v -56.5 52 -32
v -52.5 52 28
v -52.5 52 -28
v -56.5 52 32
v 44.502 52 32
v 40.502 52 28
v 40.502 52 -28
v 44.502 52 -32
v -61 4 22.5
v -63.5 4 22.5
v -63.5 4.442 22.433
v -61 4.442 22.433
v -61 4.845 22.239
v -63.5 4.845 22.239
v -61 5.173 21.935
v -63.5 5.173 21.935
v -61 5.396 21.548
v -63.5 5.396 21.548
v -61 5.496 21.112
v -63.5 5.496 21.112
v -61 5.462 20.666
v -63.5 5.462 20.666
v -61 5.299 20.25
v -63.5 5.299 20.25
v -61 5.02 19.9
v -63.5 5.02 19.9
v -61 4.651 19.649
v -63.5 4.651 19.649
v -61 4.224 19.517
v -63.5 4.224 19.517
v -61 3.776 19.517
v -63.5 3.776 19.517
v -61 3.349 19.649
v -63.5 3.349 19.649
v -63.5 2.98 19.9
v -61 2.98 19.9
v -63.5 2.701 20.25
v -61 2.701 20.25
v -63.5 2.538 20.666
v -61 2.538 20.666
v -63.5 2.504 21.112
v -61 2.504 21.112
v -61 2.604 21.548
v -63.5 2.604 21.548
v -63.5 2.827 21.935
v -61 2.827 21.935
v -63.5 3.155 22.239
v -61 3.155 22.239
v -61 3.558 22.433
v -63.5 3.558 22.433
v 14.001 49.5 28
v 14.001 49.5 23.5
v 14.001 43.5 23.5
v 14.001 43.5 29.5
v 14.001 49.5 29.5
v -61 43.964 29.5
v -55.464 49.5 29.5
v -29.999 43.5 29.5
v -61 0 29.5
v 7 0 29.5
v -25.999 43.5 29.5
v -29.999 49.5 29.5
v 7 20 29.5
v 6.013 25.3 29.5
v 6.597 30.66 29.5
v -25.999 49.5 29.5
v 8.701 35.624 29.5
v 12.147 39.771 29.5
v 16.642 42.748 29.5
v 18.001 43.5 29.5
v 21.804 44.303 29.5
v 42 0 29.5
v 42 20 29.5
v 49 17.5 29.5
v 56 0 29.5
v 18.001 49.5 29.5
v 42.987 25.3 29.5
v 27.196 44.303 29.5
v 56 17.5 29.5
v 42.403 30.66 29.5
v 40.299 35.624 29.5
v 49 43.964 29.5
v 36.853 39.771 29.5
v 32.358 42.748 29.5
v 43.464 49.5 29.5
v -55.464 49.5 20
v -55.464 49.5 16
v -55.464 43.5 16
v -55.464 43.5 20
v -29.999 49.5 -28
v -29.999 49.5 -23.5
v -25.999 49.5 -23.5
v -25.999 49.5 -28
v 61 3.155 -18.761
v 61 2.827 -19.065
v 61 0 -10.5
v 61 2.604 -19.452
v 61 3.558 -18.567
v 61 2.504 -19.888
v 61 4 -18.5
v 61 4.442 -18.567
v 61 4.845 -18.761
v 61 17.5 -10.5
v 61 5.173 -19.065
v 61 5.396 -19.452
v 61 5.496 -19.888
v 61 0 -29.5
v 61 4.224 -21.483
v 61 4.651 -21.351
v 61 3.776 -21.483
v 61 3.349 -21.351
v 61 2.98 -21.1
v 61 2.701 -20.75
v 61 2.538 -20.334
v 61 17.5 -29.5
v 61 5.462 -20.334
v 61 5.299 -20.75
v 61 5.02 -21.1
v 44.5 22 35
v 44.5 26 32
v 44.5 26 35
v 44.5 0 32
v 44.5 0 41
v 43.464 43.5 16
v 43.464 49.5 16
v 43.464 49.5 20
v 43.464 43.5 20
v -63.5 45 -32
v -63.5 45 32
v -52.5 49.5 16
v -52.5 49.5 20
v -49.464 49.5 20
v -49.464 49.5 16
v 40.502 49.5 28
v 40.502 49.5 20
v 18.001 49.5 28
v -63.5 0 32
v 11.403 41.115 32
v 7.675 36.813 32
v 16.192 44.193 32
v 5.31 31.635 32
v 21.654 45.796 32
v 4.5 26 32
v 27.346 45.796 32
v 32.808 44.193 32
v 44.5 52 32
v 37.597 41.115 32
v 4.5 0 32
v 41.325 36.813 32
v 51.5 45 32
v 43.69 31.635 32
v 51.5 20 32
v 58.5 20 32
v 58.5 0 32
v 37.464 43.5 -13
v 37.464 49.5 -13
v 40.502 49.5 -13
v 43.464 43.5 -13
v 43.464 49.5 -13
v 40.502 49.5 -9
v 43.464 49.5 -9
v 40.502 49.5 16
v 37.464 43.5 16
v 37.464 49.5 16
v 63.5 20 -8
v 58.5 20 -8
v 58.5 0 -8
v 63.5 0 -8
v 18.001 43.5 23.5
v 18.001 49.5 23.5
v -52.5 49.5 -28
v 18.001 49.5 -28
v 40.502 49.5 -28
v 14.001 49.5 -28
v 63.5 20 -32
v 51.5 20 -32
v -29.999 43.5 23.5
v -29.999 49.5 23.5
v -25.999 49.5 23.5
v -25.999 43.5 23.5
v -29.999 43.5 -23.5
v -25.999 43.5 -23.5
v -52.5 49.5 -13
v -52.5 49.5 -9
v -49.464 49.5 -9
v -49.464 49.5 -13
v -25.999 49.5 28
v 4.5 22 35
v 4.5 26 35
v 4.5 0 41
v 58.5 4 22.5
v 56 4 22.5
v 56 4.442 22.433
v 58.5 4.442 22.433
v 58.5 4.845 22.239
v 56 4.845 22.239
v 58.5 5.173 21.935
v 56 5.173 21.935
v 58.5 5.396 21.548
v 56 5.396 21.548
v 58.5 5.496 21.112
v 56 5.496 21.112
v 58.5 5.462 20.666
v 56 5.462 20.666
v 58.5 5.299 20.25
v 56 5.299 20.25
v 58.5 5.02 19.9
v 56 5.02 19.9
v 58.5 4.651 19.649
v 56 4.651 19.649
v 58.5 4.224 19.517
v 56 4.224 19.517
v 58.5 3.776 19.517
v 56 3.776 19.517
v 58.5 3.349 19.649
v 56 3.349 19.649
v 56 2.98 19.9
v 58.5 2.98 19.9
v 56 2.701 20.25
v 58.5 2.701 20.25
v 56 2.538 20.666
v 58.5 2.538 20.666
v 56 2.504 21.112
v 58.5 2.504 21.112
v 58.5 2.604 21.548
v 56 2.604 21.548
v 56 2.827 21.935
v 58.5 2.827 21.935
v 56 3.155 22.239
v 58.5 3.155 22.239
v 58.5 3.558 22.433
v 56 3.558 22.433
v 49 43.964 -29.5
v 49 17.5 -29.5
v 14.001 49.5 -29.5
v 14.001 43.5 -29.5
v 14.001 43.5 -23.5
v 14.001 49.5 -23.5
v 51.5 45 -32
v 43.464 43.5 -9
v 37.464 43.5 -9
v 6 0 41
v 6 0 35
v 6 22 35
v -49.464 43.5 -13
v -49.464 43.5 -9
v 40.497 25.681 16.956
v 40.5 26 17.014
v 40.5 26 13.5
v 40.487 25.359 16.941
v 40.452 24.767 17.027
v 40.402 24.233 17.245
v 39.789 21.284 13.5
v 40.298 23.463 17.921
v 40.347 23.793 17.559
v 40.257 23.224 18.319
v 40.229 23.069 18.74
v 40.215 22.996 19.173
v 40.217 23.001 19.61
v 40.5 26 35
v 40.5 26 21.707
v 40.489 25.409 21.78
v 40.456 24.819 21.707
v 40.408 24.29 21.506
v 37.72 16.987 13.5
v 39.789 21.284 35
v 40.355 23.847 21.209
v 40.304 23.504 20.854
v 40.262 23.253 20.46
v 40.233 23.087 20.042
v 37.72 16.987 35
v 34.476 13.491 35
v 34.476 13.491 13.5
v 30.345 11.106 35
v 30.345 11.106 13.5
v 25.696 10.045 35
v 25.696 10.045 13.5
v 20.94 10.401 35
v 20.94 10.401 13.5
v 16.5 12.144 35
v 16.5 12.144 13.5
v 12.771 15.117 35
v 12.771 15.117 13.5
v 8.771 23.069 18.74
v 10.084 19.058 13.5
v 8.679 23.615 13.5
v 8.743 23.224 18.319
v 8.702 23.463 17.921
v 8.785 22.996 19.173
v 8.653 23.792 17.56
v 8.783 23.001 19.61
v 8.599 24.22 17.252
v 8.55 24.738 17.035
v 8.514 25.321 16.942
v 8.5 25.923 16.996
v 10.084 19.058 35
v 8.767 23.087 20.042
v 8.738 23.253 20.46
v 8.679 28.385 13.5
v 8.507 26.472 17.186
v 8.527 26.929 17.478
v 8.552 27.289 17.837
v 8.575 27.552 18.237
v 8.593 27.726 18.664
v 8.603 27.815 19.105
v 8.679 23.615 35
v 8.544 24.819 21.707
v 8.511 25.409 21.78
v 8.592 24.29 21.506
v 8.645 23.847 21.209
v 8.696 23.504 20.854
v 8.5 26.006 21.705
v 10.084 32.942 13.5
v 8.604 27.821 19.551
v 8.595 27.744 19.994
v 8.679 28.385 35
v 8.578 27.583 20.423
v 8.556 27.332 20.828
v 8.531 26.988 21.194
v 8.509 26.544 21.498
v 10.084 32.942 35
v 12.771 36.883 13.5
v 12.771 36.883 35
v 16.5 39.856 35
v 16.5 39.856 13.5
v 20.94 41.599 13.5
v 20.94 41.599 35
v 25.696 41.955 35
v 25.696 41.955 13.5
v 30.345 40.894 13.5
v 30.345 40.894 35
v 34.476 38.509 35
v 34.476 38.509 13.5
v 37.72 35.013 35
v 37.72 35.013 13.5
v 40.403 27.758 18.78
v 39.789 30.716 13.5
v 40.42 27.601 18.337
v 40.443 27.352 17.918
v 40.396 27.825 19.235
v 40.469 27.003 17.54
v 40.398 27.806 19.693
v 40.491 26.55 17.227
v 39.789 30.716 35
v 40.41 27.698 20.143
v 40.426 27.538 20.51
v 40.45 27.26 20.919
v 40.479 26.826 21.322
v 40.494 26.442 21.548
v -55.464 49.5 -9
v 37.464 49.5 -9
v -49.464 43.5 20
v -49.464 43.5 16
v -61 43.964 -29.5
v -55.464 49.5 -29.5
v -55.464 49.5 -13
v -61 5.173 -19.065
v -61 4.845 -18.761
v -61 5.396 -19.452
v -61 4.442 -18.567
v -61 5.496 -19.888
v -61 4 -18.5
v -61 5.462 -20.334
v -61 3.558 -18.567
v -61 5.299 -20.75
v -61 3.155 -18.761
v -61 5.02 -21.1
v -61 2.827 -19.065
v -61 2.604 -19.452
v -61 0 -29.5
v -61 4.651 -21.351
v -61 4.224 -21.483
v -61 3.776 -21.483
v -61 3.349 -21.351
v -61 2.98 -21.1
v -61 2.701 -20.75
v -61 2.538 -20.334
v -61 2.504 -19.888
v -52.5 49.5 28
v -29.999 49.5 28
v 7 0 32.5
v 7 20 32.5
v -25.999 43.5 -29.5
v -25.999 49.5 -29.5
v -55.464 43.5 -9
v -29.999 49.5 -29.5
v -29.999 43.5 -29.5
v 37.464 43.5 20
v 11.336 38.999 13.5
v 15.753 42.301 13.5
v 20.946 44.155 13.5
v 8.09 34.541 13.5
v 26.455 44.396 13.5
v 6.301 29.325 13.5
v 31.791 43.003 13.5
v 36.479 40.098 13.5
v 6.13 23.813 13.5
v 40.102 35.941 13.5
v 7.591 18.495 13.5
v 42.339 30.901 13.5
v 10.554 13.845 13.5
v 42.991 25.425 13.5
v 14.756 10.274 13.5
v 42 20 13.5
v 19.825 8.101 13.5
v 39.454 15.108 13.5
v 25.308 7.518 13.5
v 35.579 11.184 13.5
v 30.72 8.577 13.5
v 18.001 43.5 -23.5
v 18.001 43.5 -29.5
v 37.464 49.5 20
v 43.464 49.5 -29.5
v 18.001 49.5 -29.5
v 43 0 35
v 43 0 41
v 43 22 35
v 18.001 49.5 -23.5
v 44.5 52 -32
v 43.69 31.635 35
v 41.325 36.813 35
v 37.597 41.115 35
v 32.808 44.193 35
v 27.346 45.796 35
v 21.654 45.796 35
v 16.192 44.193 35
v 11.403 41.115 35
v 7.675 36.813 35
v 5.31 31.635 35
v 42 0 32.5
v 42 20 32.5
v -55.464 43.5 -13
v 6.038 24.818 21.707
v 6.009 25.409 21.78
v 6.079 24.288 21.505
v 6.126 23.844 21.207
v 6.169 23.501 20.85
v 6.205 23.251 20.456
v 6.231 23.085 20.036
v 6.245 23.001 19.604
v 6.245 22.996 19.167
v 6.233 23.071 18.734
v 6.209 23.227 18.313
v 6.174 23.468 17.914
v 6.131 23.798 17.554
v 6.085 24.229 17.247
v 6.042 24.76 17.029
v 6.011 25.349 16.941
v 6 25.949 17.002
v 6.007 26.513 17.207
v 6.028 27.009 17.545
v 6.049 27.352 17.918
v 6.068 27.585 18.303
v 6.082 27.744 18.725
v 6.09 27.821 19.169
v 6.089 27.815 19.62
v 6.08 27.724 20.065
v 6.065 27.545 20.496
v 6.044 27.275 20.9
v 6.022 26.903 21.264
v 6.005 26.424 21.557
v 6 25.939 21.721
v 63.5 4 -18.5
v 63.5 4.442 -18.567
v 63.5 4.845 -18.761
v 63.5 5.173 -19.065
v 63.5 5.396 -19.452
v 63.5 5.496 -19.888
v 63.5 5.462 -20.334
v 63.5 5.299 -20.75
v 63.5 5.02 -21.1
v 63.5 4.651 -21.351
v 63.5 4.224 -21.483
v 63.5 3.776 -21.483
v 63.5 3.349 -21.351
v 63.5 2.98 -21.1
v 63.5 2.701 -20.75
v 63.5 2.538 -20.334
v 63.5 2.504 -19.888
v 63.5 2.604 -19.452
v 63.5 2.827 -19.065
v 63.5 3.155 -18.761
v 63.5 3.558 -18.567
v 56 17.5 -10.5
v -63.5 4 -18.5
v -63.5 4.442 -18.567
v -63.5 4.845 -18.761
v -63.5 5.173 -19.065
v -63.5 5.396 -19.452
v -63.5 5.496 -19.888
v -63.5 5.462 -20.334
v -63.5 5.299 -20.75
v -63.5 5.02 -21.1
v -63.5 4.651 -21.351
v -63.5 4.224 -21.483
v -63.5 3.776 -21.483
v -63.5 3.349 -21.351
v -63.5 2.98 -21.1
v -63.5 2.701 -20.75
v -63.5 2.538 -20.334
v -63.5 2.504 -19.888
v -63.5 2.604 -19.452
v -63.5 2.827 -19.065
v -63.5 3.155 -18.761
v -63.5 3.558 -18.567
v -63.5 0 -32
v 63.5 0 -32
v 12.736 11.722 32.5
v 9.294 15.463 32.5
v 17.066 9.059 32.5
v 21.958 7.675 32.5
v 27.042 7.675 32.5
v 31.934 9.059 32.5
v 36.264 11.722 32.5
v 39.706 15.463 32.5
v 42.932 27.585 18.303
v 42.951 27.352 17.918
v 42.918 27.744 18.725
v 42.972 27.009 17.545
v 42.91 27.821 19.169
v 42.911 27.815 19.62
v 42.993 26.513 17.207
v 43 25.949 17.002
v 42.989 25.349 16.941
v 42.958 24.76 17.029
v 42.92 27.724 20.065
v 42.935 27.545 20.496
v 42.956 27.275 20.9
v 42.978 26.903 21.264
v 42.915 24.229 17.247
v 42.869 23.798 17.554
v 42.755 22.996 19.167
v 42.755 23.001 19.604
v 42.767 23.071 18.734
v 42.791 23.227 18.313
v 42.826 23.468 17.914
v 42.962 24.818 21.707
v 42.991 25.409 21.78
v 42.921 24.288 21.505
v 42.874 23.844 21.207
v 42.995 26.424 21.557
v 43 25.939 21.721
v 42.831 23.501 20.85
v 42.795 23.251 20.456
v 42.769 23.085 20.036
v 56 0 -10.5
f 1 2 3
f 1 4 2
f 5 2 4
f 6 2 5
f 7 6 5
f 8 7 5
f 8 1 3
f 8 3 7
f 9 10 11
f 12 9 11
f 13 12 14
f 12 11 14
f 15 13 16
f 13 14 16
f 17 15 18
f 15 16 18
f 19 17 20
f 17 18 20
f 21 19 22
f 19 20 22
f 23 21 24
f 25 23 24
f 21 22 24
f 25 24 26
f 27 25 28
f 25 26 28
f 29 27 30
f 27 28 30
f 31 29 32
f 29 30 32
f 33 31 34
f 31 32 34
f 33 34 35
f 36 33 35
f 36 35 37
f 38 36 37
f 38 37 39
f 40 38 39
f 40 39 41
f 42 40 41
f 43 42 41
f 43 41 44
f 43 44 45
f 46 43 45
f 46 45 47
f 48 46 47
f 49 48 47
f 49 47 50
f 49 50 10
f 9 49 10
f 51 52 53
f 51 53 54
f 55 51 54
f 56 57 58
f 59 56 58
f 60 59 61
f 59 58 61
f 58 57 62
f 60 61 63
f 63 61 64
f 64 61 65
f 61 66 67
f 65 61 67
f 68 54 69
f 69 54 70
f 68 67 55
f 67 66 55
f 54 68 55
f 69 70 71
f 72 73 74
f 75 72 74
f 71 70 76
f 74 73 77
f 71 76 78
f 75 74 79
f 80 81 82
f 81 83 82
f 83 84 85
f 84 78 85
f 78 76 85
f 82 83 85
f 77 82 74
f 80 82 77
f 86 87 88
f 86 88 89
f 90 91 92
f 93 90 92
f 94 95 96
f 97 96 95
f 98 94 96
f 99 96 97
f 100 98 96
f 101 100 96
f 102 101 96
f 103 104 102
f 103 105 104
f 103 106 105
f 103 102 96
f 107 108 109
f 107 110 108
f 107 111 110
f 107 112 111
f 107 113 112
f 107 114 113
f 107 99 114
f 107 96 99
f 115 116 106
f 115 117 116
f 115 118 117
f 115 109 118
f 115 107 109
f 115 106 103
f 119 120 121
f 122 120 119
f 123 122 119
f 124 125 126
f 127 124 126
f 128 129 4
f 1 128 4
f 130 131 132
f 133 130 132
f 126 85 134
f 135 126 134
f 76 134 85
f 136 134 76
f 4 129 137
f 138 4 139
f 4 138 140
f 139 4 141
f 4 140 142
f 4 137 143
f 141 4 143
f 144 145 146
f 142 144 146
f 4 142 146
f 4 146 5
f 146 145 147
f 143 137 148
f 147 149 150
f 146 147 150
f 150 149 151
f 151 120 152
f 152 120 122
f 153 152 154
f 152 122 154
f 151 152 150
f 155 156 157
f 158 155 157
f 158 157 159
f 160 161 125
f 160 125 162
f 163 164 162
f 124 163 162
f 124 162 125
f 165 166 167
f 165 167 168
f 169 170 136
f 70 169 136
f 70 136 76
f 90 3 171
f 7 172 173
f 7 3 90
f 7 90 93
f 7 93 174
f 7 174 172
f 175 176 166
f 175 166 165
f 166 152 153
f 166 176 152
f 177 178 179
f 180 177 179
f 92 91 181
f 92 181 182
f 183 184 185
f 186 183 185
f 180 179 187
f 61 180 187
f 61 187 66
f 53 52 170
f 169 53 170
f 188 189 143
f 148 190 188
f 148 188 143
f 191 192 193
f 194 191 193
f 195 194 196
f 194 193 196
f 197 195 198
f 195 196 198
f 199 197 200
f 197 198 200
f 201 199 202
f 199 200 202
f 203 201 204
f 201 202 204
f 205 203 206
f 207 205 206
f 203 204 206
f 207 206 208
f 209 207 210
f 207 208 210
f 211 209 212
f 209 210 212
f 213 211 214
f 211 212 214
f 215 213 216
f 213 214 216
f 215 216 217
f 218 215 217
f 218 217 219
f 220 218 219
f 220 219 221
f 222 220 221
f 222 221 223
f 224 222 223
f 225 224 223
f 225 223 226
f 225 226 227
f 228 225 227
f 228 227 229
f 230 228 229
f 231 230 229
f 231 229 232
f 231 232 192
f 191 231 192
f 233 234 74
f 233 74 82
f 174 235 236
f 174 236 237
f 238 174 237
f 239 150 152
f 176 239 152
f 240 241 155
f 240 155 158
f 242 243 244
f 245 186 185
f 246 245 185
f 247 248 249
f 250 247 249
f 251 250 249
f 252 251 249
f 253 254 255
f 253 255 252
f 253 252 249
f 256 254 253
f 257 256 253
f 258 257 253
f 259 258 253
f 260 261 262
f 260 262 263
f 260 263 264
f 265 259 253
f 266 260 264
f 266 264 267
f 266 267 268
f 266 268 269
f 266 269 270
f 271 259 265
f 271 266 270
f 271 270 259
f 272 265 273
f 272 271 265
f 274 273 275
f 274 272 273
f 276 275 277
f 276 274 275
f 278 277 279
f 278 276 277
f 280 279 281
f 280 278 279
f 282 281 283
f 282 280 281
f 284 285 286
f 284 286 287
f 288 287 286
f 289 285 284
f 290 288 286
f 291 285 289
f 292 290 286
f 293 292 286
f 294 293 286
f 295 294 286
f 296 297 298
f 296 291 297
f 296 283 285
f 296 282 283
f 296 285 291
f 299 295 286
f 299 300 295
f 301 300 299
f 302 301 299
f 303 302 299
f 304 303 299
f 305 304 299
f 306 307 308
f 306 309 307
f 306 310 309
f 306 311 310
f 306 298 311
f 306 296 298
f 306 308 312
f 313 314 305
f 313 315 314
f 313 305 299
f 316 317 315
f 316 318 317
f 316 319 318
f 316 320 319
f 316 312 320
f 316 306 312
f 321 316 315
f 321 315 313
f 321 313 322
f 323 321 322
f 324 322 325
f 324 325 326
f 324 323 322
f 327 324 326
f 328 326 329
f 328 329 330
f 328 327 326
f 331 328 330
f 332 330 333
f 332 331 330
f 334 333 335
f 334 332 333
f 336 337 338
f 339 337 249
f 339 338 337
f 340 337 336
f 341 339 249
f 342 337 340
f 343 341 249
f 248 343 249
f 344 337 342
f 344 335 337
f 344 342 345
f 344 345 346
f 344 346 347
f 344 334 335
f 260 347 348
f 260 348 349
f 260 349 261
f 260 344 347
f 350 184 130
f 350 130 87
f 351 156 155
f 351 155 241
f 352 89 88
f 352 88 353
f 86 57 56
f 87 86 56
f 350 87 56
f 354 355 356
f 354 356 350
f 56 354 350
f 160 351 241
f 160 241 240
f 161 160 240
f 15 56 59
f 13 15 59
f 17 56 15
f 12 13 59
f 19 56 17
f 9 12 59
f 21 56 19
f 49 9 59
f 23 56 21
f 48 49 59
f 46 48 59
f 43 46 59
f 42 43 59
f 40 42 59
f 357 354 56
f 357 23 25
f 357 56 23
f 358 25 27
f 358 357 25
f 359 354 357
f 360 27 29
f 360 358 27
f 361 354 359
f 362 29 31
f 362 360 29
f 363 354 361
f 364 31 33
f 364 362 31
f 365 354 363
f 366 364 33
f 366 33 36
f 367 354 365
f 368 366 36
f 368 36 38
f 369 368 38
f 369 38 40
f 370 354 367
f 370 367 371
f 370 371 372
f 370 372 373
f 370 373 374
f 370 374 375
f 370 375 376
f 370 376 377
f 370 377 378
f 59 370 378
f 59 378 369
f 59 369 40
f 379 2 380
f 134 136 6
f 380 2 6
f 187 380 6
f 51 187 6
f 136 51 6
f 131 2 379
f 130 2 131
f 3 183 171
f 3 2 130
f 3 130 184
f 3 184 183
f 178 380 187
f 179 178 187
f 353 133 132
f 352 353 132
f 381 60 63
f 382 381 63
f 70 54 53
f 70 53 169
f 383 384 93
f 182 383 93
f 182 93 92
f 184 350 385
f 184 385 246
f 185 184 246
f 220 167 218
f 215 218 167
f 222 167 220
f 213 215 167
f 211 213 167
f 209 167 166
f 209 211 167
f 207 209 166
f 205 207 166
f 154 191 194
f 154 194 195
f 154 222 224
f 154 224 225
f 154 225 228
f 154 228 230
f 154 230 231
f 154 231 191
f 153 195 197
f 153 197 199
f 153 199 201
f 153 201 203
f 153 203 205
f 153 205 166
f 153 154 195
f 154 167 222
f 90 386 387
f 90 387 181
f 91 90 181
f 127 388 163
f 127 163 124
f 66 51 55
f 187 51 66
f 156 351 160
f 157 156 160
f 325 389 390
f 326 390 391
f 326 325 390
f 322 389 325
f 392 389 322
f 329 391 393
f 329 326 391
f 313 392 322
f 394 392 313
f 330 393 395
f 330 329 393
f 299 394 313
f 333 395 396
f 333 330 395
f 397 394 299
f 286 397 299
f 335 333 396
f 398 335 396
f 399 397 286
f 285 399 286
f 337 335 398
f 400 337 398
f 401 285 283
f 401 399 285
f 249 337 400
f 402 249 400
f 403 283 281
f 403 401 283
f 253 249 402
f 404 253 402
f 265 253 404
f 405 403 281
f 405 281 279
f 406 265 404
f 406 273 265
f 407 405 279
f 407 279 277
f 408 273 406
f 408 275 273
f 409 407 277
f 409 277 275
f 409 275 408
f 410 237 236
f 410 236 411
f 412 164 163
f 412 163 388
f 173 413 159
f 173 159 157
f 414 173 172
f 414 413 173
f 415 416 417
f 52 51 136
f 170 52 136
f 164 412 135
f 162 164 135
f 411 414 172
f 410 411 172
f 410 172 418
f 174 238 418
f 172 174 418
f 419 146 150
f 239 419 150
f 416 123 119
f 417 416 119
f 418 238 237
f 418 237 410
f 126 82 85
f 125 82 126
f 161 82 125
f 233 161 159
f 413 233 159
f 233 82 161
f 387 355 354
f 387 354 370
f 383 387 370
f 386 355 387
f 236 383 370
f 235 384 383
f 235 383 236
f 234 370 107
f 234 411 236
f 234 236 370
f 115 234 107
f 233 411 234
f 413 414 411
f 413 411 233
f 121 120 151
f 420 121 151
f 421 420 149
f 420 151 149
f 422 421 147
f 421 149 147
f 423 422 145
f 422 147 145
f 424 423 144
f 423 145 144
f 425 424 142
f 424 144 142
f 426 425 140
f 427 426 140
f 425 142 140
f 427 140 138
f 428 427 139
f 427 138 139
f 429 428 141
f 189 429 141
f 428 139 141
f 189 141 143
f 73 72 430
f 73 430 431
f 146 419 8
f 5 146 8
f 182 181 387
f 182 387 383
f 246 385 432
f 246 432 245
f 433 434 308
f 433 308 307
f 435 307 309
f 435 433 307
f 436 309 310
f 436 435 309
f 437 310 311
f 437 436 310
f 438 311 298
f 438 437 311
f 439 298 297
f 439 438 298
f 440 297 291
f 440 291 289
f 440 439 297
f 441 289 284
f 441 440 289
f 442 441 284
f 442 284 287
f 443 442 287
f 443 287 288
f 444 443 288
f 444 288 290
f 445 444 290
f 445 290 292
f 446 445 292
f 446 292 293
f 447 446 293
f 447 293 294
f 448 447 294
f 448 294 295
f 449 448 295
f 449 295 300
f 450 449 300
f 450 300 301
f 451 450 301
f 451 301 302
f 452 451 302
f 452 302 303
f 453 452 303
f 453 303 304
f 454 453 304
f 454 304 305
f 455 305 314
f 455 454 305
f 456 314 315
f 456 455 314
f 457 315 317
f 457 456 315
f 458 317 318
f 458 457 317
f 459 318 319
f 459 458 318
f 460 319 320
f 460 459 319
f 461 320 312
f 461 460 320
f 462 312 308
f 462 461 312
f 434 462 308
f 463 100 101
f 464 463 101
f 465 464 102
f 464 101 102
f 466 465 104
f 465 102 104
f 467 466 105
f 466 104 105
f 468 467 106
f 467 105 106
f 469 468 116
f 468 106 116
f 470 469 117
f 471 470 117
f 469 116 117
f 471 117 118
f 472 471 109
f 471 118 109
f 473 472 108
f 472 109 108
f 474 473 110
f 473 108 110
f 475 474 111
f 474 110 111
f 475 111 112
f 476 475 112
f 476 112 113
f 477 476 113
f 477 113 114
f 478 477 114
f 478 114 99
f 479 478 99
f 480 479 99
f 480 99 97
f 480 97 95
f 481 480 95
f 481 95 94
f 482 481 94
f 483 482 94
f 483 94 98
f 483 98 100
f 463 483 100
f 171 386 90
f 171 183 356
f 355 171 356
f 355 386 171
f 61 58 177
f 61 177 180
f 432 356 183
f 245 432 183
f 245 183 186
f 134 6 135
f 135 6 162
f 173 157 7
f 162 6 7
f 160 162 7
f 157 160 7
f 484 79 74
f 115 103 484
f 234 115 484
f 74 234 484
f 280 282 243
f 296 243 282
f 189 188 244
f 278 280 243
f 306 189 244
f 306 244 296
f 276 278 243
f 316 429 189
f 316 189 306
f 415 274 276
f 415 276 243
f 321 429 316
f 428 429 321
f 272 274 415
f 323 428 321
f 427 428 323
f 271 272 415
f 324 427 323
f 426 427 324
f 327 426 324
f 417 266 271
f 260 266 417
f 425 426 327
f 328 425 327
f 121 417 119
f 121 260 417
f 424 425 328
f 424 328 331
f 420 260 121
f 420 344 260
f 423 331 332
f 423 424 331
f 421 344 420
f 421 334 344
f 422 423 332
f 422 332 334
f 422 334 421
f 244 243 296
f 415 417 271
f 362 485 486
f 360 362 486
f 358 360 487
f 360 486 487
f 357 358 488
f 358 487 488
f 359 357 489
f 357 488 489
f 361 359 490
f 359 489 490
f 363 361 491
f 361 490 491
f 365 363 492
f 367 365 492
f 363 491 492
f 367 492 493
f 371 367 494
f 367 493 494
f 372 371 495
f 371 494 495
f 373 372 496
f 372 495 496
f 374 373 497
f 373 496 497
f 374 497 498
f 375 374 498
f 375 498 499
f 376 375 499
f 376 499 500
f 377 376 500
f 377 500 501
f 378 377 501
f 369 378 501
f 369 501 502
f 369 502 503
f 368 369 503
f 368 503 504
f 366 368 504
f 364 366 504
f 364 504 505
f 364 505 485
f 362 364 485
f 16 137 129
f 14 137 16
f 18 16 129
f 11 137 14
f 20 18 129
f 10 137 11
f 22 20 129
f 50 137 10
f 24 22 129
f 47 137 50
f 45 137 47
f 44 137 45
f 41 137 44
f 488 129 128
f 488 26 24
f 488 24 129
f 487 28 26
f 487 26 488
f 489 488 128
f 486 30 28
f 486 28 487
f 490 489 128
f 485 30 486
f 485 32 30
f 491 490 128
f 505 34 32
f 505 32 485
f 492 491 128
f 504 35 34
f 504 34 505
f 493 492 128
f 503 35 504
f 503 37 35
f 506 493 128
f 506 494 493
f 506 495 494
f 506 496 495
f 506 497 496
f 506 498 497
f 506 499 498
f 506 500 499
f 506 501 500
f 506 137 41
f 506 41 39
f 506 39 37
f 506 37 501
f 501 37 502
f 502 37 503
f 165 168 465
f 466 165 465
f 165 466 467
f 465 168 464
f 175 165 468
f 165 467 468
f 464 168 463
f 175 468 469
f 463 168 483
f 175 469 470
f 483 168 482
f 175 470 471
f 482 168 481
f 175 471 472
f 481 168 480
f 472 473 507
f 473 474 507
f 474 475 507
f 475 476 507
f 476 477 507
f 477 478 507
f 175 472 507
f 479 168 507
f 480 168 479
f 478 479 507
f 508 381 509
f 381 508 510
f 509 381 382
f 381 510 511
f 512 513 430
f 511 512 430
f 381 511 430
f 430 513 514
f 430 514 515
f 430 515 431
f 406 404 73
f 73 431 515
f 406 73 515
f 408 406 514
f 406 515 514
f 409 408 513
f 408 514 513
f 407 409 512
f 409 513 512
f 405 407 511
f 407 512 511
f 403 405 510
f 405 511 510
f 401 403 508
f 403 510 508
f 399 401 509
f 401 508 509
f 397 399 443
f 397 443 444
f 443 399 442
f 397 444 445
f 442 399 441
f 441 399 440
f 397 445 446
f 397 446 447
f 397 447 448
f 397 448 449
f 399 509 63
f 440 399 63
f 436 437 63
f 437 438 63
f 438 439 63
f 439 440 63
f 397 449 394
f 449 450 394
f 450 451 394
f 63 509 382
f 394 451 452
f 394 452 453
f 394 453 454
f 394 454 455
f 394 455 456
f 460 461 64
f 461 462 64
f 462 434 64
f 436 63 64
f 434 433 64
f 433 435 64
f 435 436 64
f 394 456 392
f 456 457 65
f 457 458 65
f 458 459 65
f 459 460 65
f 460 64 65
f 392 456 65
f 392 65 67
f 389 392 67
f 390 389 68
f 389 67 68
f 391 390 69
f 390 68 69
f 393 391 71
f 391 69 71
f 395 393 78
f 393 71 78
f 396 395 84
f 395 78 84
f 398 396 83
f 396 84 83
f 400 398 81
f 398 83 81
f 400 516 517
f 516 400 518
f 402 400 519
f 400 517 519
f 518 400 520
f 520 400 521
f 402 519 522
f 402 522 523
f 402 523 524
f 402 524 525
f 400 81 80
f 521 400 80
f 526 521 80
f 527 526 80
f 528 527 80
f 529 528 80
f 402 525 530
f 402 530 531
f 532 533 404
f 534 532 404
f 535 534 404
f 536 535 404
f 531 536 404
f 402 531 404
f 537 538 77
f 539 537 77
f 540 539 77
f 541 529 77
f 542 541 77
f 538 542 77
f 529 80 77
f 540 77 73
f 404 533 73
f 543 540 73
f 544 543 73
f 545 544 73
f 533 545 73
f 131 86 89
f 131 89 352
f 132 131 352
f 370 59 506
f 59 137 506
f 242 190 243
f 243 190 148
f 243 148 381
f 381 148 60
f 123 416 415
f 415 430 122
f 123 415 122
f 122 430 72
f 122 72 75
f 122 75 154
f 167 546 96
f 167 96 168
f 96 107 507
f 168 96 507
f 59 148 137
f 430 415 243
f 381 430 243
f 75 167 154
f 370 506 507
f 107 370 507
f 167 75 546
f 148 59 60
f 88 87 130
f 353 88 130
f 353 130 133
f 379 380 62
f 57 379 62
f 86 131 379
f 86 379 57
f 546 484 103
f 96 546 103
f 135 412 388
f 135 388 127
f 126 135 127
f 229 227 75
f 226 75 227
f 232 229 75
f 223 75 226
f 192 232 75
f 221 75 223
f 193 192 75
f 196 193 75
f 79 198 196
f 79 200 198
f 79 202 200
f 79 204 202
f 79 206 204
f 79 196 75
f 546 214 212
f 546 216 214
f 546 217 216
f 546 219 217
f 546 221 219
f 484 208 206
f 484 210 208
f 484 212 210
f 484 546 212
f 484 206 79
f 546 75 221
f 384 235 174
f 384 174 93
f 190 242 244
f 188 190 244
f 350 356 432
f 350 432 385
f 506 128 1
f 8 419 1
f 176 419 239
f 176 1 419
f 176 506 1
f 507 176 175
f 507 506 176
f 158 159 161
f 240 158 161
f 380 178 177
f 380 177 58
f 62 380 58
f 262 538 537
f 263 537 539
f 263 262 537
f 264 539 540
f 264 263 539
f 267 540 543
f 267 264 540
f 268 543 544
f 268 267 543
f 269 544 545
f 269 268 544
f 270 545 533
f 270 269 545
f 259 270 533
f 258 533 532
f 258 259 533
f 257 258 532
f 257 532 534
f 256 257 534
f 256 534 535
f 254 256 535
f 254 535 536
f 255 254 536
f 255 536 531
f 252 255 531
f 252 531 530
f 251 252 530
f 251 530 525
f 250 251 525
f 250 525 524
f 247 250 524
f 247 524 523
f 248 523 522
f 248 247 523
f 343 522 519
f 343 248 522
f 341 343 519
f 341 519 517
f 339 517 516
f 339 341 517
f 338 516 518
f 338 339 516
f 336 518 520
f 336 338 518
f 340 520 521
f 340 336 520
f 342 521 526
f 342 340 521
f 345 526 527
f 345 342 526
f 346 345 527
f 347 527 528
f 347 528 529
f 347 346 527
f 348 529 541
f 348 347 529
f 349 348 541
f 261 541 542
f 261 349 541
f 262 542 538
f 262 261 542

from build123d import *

# Parameters (mm, degrees)
CROQUIS1_W              = 127
CROQUIS1_H              = 64
SALIENTE_EXTRUIR1_DEPTH = 52
CORTAR_EXTRUIR1_DEPTH   = 105.078095678
CORTAR_EXTRUIR2_DEPTH   = 105.078095678
CROQUIS4_W              = 5
CROQUIS4_H              = 20
CORTAR_EXTRUIR3_DEPTH   = 40
SALIENTE_EXTRUIR2_DEPTH = 26
VACIADO1_START          = -29.5
VACIADO1_DEPTH          = 59
VACIADO1_START_2        = 29.5
VACIADO1_2_OUTLINE_W    = 35
VACIADO1_2_OUTLINE_H    = 23.5
VACIADO1_2_DEPTH        = 3
VACIADO1_3_OUTLINE_W    = 5
VACIADO1_3_OUTLINE_H    = 17.5
VACIADO1_3_DEPTH        = 19
CORTAR_EXTRUIR4_DEPTH   = 127.684647847
SALIENTE_EXTRUIR3_DEPTH = 3
CROQUIS8_R              = 16
CORTAR_EXTRUIR5_DEPTH   = 10
CROQUIS9_R              = 18.5
CROQUIS9_R_2            = 16
SALIENTE_EXTRUIR4_DEPTH = 19
CROQUIS11_R             = 2.42
CORTAR_EXTRUIR6_DEPTH   = 39
CROQUIS12_W             = 93.002602727
CROQUIS12_H             = 56
CORTAR_EXTRUIR8_DEPTH   = 5
CROQUIS13_W             = 4
CROQUIS13_H             = 6
CROQUIS13_W_2           = 6
CROQUIS13_H_2           = 4
SALIENTE_EXTRUIR5_DEPTH = 6
CROQUIS14_R             = 1.5
CORTAR_EXTRUIR9_DEPTH   = 144.227092409


# Read off the part's stored shape, not the designer's step: Vaciado1
with BuildPart() as part:
    # Croquis1 → Saliente-Extruir1 (new body)
    with BuildSketch(Plane(origin=(0, 0, 0), x_dir=(1, 0, 0), z_dir=(0, 1, 0))):
        Rectangle(CROQUIS1_W, CROQUIS1_H)
    extrude(amount=SALIENTE_EXTRUIR1_DEPTH)

    # Croquis2 → Cortar-Extruir1 (cut, through all)
    with BuildSketch(Plane.XY.offset(32)):
        Polygon((-63.5, 52), (-63.5, 45), (-56.500349973, 51.999650027), align=None)
        Polygon((51.5, 20), (63.5, 20), (63.5, 52), (44.500349973, 51.999650027), (51.5, 45), align=None)
    extrude(amount=-CORTAR_EXTRUIR1_DEPTH, mode=Mode.SUBTRACT)

    # Croquis3 → Cortar-Extruir2 (cut, through all)
    with BuildSketch(Plane.XY.offset(32)):
        Polygon((-56.500349973, 51.999650027), (-56.487592612, 52.42007755), (-63.863183818, 52.643880882), (-63.863183818, 51.396655122), (-58.40187656, 51.777539568), align=None)
        Polygon((44.500349973, 51.999650027), (64.754794762, 55.7043164), (64.754794762, 48.499825013), align=None)
    extrude(amount=-CORTAR_EXTRUIR2_DEPTH, mode=Mode.SUBTRACT)

    # Croquis4 → Cortar-Extruir3 (cut)
    with BuildSketch(Plane.XY.offset(32)):
        with Locations((61, 10)):
            Rectangle(CROQUIS4_W, CROQUIS4_H)
    extrude(amount=-CORTAR_EXTRUIR3_DEPTH, mode=Mode.SUBTRACT)

    # Croquis5 → Saliente-Extruir2 (add)
    with BuildSketch(Plane.XZ):
        Polygon((44.5, 32), (44.5, 41), (43, 41), (43, 35), (6, 35), (6, 41), (4.5, 41), (4.5, 32), align=None)
    extrude(amount=-SALIENTE_EXTRUIR2_DEPTH)

    # Vaciado1 outline → Vaciado1 (cut)
    with BuildSketch(Plane.XY.offset(VACIADO1_START)):
        Polygon((56, 0), (56, 17.5), (49, 17.5), (49, 43.964466094), (43.464466094, 49.5), (-55.464466094, 49.5), (-61, 43.964466094), (-61, 0), align=None)
    extrude(amount=VACIADO1_DEPTH, mode=Mode.SUBTRACT)

    # Vaciado1 2 outline → Vaciado1 2 (cut)
    with BuildSketch(Plane.XY.offset(VACIADO1_START_2)):
        with Locations((24.5, 11.75)):
            Rectangle(VACIADO1_2_OUTLINE_W, VACIADO1_2_OUTLINE_H)
    extrude(amount=VACIADO1_2_DEPTH, mode=Mode.SUBTRACT)

    # Vaciado1 3 outline → Vaciado1 3 (cut)
    with BuildSketch(Plane.XY.offset(VACIADO1_START)):
        with Locations((58.5, 8.75)):
            Rectangle(VACIADO1_3_OUTLINE_W, VACIADO1_3_OUTLINE_H)
    extrude(amount=VACIADO1_3_DEPTH, mode=Mode.SUBTRACT)

    # Croquis6 → Cortar-Extruir4 (cut, through all)
    with BuildSketch(Plane(origin=(44.5, 0, 0), x_dir=(0, 0, -1), z_dir=(1, 0, 0))):
        Polygon((-41, 0), (-35, 22), (-35, 26), (-41, 26), align=None)
    extrude(amount=-CORTAR_EXTRUIR4_DEPTH, mode=Mode.SUBTRACT)

    # Croquis7 → Saliente-Extruir3 (add)
    with BuildSketch(Plane.XY.offset(32)):
        with BuildLine():
            Line((4.5, 26), (44.5, 26))
            ThreePointArc((44.5, 26), (24.5, 46), (4.5, 26))
        make_face()
    extrude(amount=SALIENTE_EXTRUIR3_DEPTH)

    # Croquis8 → Cortar-Extruir5 (cut)
    with BuildSketch(Plane.XY.offset(35)):
        with Locations((24.5, 26)):
            Circle(CROQUIS8_R)
    extrude(amount=-CORTAR_EXTRUIR5_DEPTH, mode=Mode.SUBTRACT)

    # Croquis9 → Saliente-Extruir4 (add)
    with BuildSketch(Plane(origin=(0, 0, 32.5), x_dir=(-1, 0, 0), z_dir=(0, 0, -1))):
        with Locations(Location((-24.5, 26, 0), (0, 0, 198.924644416))):
            Circle(CROQUIS9_R)
        with Locations(Location((-24.5, 26, 0), (0, 0, 180))):
            Circle(CROQUIS9_R_2, mode=Mode.SUBTRACT)
    extrude(amount=SALIENTE_EXTRUIR4_DEPTH)

    # Croquis11 → Cortar-Extruir6 (cut)
    with BuildSketch(Plane(origin=(6, 0, 0), x_dir=(0, 0, -1), z_dir=(1, 0, 0))):
        with Locations(Location((-19.360313857, 25.408506724, 0), (0, 0, 180))):
            Circle(CROQUIS11_R)
    extrude(amount=CORTAR_EXTRUIR6_DEPTH, mode=Mode.SUBTRACT)

    # Croquis12 → Cortar-Extruir8 (cut)
    with BuildSketch(Plane(origin=(0, 52, 0), x_dir=(1, 0, 0), z_dir=(0, 1, 0))):
        with Locations((-5.99903799, 0)):
            Rectangle(CROQUIS12_W, CROQUIS12_H)
    extrude(amount=-CORTAR_EXTRUIR8_DEPTH, mode=Mode.SUBTRACT)

    # Croquis13 → Saliente-Extruir5 (add)
    with BuildSketch(Plane.XZ.offset(-49.5)):
        with Locations((-27.999466094, 26.5)):
            Rectangle(CROQUIS13_W, CROQUIS13_H)
        with Locations((16.000533906, 26.5)):
            Rectangle(CROQUIS13_W, CROQUIS13_H)
        with Locations((16.000533906, -26.5)):
            Rectangle(CROQUIS13_W, CROQUIS13_H)
        with Locations((-27.999466094, -26.5)):
            Rectangle(CROQUIS13_W, CROQUIS13_H)
        with Locations((-52.464466094, 18)):
            Rectangle(CROQUIS13_W_2, CROQUIS13_H_2)
        with Locations((40.464466094, 18)):
            Rectangle(CROQUIS13_W_2, CROQUIS13_H_2)
        with Locations((40.464466094, -11)):
            Rectangle(CROQUIS13_W_2, CROQUIS13_H_2)
        with Locations((-52.464466094, -11)):
            Rectangle(CROQUIS13_W_2, CROQUIS13_H_2)
    extrude(amount=SALIENTE_EXTRUIR5_DEPTH)

    # Croquis14 → Cortar-Extruir9 (cut, through all)
    with BuildSketch(Plane.ZY.offset(63.5)):
        with Locations((-20, 4)):
            Circle(CROQUIS14_R)
        with Locations((21, 4)):
            Circle(CROQUIS14_R)
    extrude(amount=-CORTAR_EXTRUIR9_DEPTH, mode=Mode.SUBTRACT)


solid = part.part
